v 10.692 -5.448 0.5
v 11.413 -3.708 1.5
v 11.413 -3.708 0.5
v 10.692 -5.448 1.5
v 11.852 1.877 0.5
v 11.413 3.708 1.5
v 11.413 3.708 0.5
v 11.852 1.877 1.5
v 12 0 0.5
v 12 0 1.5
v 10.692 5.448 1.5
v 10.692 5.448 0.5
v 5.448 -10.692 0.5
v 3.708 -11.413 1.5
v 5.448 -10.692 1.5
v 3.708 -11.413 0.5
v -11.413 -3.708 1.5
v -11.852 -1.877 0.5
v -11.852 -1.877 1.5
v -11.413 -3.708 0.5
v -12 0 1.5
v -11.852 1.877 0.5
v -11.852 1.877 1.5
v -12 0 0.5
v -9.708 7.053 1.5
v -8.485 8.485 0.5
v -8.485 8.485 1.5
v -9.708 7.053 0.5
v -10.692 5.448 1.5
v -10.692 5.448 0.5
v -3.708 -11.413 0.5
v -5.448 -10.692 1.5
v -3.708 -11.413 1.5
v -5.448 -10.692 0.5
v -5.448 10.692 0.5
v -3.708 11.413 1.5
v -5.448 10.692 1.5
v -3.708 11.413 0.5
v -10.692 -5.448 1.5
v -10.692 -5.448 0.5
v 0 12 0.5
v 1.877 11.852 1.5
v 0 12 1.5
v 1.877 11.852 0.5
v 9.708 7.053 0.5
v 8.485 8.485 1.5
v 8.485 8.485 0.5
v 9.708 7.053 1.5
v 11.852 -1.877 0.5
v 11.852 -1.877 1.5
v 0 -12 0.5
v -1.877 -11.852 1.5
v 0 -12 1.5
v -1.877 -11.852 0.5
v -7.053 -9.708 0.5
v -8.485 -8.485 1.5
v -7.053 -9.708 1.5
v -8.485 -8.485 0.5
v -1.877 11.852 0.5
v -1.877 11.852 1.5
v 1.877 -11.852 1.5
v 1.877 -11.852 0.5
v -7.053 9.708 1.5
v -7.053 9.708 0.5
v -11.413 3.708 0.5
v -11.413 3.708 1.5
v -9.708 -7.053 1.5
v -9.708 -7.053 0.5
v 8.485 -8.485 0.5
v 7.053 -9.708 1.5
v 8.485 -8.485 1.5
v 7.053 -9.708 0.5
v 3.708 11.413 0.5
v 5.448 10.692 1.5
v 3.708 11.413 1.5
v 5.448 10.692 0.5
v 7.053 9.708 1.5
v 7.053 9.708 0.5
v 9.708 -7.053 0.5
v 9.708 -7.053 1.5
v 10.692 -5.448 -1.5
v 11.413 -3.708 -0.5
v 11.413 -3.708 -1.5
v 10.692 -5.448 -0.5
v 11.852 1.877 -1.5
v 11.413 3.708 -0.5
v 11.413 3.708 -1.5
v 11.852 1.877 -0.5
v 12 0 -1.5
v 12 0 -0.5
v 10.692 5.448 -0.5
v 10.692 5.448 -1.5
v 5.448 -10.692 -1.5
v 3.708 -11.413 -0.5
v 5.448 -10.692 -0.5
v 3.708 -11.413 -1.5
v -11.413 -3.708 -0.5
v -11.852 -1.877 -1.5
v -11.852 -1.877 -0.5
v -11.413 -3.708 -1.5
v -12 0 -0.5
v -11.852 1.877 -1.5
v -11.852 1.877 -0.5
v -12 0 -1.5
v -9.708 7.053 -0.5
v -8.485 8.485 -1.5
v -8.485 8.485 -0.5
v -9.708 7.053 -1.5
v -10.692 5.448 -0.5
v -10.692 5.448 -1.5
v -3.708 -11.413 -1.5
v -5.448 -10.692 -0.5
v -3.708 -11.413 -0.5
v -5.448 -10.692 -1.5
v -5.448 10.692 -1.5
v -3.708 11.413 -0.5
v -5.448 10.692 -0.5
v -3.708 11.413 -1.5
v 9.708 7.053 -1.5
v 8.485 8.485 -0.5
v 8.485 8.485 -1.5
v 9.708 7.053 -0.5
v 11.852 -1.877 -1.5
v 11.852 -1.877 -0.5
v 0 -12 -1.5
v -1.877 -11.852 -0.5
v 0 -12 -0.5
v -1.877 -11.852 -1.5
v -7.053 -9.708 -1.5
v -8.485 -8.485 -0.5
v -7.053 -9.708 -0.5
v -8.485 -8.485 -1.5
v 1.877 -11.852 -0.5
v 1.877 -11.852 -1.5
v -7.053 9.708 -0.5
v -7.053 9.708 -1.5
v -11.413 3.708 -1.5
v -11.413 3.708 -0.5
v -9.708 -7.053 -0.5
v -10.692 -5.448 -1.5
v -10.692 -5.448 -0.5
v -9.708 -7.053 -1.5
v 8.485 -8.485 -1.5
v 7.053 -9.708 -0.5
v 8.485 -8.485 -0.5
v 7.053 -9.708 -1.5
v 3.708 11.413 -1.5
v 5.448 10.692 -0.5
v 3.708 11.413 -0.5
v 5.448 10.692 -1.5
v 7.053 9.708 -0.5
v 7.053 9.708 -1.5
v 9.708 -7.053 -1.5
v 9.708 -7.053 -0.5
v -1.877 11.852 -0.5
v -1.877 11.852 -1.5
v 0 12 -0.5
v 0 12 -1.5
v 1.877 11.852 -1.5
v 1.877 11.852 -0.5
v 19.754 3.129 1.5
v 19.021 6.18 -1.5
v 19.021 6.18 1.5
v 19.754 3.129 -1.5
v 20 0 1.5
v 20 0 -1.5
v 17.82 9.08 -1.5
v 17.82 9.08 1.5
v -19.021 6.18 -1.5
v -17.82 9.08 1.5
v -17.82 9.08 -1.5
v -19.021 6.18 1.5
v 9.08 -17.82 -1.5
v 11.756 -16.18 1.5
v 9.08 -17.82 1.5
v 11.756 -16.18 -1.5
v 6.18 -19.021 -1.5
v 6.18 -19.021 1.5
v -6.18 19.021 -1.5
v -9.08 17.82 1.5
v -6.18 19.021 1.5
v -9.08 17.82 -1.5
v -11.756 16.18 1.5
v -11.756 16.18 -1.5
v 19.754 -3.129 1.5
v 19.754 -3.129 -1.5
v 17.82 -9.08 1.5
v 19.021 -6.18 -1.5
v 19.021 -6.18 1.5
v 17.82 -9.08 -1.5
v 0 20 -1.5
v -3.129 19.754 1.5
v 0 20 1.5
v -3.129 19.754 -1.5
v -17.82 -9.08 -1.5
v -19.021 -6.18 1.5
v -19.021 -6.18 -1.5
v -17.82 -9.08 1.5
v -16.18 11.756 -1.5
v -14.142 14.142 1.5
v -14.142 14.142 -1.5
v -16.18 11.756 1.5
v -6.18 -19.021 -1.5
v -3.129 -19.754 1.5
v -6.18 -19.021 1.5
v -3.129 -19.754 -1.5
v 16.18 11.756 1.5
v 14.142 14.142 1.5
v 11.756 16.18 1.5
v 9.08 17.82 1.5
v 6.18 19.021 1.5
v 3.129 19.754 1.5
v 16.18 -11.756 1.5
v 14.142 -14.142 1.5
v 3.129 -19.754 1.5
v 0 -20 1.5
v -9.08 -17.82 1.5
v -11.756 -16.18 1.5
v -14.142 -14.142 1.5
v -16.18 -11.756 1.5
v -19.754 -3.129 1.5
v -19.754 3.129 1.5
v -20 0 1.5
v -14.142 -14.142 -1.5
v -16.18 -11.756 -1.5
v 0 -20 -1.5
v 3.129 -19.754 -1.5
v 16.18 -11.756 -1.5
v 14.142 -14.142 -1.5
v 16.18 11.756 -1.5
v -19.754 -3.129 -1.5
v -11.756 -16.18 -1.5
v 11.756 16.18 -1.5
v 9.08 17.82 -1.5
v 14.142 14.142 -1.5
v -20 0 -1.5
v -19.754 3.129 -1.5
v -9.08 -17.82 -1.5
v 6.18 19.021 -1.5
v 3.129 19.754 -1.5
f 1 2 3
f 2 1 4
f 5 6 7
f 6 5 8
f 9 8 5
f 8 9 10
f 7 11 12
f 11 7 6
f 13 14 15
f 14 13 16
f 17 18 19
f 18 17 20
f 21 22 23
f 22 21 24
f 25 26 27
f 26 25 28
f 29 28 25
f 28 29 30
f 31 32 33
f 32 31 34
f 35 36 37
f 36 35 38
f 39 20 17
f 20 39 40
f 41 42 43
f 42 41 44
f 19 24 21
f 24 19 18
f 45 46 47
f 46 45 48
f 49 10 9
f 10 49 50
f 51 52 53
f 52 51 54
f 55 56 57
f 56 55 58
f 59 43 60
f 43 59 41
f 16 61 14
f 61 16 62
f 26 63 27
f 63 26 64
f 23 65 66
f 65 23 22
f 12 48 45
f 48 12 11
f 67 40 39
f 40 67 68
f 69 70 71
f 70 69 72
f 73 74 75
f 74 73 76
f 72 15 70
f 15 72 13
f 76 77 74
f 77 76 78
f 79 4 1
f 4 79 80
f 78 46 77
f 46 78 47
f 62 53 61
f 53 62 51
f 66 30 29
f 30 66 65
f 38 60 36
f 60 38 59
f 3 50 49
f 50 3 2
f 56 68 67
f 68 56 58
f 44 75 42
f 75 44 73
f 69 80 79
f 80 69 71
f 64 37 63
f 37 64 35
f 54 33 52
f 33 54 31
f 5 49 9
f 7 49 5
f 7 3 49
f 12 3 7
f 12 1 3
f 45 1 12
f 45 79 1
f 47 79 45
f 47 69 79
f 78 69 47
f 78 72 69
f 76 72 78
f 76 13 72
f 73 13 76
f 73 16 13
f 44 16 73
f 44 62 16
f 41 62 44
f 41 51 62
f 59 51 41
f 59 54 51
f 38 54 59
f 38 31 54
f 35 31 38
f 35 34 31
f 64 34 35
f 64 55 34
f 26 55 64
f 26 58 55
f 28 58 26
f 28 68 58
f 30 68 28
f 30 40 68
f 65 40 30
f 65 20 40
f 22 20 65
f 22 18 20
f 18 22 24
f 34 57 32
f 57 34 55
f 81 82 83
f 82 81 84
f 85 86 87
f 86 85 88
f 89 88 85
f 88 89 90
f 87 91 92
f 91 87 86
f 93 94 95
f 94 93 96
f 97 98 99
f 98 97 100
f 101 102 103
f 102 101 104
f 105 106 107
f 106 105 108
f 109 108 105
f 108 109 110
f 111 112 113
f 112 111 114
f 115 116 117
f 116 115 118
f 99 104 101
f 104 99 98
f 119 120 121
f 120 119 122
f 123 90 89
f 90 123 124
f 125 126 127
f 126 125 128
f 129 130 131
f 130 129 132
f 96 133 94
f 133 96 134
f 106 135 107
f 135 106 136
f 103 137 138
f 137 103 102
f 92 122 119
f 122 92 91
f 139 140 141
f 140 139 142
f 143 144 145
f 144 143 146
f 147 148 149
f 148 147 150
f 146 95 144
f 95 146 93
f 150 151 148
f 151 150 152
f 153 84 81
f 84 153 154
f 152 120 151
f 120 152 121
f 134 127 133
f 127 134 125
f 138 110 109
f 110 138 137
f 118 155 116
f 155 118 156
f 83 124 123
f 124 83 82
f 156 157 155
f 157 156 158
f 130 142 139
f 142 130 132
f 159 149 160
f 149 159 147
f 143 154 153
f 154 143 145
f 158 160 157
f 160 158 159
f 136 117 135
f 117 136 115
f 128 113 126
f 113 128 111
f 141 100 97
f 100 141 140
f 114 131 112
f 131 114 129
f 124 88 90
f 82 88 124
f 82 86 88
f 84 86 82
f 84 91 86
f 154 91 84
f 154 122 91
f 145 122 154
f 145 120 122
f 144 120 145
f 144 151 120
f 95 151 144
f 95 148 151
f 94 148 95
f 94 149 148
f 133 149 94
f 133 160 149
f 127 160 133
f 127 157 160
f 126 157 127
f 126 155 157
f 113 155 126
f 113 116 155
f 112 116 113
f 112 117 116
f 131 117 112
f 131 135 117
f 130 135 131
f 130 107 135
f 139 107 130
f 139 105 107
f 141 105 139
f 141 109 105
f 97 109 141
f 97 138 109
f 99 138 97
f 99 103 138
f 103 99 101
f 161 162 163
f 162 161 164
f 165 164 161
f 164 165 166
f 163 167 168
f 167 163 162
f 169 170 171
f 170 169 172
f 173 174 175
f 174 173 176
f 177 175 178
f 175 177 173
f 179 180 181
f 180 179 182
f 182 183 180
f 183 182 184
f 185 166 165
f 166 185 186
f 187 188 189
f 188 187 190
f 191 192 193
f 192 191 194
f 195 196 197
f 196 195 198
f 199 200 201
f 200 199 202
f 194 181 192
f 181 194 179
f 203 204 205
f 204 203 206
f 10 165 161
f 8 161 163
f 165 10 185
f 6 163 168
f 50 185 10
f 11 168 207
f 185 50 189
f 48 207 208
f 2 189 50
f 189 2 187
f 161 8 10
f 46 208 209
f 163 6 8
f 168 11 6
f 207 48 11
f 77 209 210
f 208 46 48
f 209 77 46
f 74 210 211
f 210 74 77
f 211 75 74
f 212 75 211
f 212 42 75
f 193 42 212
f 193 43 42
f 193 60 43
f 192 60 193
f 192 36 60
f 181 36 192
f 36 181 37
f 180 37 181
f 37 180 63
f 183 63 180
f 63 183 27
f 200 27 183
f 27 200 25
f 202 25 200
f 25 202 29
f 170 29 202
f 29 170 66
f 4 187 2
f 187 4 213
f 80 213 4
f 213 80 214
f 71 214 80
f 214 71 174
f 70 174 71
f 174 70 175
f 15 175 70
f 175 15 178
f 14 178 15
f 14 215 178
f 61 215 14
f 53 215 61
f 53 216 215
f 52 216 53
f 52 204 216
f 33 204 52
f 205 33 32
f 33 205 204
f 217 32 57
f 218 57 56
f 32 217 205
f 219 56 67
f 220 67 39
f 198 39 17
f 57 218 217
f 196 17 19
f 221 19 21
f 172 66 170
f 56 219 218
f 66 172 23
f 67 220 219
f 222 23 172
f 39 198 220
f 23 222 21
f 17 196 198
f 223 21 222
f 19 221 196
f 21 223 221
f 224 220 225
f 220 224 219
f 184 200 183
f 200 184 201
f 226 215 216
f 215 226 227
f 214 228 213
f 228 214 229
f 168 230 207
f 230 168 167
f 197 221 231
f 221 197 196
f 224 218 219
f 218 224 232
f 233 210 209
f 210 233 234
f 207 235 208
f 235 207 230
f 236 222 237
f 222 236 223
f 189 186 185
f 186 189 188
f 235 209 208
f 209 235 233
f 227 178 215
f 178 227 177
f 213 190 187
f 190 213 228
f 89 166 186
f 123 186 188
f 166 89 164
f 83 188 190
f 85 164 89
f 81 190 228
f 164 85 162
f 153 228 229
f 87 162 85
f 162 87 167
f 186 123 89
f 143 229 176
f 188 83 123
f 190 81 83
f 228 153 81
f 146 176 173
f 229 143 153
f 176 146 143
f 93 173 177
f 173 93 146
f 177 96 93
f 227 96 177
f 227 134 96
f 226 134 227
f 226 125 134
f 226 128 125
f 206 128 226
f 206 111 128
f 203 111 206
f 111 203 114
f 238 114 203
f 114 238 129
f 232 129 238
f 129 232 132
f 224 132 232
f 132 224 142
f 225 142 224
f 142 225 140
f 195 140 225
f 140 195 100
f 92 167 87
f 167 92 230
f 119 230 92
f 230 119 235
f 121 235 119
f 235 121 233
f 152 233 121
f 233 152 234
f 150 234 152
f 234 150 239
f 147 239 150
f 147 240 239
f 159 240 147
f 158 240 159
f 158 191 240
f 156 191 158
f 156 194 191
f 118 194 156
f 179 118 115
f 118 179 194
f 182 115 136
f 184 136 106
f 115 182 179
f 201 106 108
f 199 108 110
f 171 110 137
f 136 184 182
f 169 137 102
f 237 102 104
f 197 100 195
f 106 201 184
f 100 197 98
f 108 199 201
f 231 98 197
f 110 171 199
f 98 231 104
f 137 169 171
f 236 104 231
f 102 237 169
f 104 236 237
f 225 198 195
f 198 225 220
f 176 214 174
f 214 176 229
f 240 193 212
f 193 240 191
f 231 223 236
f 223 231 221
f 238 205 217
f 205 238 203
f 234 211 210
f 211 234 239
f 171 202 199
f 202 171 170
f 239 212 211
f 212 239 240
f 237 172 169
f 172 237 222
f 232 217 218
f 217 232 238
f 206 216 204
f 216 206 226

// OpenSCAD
module Coin(v){

difference(){


      color(v[0])
      cylinder(3,20,20, center= true, $fn = 40);
        
     color(v[1]){   
        translate([0,0,2])
        cylinder(3,12,12, center= true, $fn = 40);
        
                
        translate([0,0,-2])
        cylinder(3,12,12, center= true, $fn = 40);
    }

}
}

bronze = ["#CD7F32","#7b4c1e"]; 
silver = ["#c4aead","#cdc9c9"];
gold = ["#ffd700","#daa520"];

Coin(silver);
